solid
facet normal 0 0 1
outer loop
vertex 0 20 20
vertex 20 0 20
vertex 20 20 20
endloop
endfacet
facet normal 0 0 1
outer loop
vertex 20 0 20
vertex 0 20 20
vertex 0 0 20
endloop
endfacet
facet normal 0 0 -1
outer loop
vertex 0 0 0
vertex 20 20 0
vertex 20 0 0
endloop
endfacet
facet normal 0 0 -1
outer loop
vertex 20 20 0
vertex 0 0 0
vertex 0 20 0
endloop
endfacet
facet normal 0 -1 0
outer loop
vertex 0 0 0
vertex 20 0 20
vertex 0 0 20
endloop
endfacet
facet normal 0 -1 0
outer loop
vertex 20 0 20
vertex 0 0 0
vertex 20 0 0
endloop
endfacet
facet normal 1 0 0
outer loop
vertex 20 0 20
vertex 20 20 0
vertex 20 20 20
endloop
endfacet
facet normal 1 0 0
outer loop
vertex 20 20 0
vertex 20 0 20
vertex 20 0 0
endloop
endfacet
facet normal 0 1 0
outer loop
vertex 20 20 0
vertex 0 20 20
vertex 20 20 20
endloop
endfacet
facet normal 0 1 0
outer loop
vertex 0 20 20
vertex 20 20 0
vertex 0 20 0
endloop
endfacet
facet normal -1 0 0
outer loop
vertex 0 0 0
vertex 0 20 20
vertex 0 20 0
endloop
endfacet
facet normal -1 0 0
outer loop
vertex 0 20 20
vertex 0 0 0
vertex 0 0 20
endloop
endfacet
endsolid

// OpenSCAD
/*
	calibration-cube — 20 mm XYZ 尺寸 / 轴校准立方体

	测什么
		打印一个 20×20×20 的立方，用卡尺量 X / Y / Z 三个方向。
		这是整套标准体里最基础的一件：它先证明机器"尺寸可信"，
		后面的流量、悬垂、桥接判读才有意义。

	怎么判读
		- 三个方向都应为 20.00 ±0.05 mm。
		- 偏大：挤出过量（flow >100%），或切片器的 XY 补偿为正。
		- 偏小：流量不足、皮带张力不够、Steps/mm 偏小。
		- X 与 Y 相差 >0.1 mm：两轴不一致，查皮带 / 两轴 Steps/mm。
		- 只 Z 偏小 0.1–0.3 mm：通常是首层被压（z-offset 偏低），不是步进问题。
		- 顶面有凹陷 / 立柱间有缝：顶面层数不足（top solid layers 少于 4）。

	期望值（默认参数）
		STL 体积 8.000 cm³，包围盒 20.00 × 20.00 × 20.00 mm，水密、单实体。
		开 chamfer 后体积会变小，判读尺寸时只量下部直壁。

	参数
		size     边长 (mm)
		chamfer  >0 时把顶面四条边削成 45° 倒角（便于观察顶面接缝）
*/

/* [尺寸] */
size = 20;        // 边长 (mm)：量 X/Y/Z，期望 20.00 ±0.05

/* [顶面倒角] */
chamfer = 0;      // 顶面 45° 倒角 (mm)：0 = 纯立方

assert(size > 0, "size 必须 > 0");
assert(chamfer >= 0 && chamfer < size / 2, "chamfer 必须 >= 0 且 < size/2");

module calibration_cube(s = size, c = chamfer) {
	if (c <= 0) {
		// 纯立方：没有圆角、没有倒角，STL 就是 12 个面，量出来的就是机器的真实误差
		cube([s, s, s]);
	} else {
		// 只削顶面：底块保持全尺寸直壁，顶块内缩，凸包给出四面 45° 倒角。
		// 这样直壁仍然从 z=0 一直量到 s-c，不会因为倒角把尺寸基准弄丢。
		hull() {
			cube([s, s, s - c]);
			translate([c, c, s - c]) cube([s - 2 * c, s - 2 * c, c]);
		}
	}
}

calibration_cube();
